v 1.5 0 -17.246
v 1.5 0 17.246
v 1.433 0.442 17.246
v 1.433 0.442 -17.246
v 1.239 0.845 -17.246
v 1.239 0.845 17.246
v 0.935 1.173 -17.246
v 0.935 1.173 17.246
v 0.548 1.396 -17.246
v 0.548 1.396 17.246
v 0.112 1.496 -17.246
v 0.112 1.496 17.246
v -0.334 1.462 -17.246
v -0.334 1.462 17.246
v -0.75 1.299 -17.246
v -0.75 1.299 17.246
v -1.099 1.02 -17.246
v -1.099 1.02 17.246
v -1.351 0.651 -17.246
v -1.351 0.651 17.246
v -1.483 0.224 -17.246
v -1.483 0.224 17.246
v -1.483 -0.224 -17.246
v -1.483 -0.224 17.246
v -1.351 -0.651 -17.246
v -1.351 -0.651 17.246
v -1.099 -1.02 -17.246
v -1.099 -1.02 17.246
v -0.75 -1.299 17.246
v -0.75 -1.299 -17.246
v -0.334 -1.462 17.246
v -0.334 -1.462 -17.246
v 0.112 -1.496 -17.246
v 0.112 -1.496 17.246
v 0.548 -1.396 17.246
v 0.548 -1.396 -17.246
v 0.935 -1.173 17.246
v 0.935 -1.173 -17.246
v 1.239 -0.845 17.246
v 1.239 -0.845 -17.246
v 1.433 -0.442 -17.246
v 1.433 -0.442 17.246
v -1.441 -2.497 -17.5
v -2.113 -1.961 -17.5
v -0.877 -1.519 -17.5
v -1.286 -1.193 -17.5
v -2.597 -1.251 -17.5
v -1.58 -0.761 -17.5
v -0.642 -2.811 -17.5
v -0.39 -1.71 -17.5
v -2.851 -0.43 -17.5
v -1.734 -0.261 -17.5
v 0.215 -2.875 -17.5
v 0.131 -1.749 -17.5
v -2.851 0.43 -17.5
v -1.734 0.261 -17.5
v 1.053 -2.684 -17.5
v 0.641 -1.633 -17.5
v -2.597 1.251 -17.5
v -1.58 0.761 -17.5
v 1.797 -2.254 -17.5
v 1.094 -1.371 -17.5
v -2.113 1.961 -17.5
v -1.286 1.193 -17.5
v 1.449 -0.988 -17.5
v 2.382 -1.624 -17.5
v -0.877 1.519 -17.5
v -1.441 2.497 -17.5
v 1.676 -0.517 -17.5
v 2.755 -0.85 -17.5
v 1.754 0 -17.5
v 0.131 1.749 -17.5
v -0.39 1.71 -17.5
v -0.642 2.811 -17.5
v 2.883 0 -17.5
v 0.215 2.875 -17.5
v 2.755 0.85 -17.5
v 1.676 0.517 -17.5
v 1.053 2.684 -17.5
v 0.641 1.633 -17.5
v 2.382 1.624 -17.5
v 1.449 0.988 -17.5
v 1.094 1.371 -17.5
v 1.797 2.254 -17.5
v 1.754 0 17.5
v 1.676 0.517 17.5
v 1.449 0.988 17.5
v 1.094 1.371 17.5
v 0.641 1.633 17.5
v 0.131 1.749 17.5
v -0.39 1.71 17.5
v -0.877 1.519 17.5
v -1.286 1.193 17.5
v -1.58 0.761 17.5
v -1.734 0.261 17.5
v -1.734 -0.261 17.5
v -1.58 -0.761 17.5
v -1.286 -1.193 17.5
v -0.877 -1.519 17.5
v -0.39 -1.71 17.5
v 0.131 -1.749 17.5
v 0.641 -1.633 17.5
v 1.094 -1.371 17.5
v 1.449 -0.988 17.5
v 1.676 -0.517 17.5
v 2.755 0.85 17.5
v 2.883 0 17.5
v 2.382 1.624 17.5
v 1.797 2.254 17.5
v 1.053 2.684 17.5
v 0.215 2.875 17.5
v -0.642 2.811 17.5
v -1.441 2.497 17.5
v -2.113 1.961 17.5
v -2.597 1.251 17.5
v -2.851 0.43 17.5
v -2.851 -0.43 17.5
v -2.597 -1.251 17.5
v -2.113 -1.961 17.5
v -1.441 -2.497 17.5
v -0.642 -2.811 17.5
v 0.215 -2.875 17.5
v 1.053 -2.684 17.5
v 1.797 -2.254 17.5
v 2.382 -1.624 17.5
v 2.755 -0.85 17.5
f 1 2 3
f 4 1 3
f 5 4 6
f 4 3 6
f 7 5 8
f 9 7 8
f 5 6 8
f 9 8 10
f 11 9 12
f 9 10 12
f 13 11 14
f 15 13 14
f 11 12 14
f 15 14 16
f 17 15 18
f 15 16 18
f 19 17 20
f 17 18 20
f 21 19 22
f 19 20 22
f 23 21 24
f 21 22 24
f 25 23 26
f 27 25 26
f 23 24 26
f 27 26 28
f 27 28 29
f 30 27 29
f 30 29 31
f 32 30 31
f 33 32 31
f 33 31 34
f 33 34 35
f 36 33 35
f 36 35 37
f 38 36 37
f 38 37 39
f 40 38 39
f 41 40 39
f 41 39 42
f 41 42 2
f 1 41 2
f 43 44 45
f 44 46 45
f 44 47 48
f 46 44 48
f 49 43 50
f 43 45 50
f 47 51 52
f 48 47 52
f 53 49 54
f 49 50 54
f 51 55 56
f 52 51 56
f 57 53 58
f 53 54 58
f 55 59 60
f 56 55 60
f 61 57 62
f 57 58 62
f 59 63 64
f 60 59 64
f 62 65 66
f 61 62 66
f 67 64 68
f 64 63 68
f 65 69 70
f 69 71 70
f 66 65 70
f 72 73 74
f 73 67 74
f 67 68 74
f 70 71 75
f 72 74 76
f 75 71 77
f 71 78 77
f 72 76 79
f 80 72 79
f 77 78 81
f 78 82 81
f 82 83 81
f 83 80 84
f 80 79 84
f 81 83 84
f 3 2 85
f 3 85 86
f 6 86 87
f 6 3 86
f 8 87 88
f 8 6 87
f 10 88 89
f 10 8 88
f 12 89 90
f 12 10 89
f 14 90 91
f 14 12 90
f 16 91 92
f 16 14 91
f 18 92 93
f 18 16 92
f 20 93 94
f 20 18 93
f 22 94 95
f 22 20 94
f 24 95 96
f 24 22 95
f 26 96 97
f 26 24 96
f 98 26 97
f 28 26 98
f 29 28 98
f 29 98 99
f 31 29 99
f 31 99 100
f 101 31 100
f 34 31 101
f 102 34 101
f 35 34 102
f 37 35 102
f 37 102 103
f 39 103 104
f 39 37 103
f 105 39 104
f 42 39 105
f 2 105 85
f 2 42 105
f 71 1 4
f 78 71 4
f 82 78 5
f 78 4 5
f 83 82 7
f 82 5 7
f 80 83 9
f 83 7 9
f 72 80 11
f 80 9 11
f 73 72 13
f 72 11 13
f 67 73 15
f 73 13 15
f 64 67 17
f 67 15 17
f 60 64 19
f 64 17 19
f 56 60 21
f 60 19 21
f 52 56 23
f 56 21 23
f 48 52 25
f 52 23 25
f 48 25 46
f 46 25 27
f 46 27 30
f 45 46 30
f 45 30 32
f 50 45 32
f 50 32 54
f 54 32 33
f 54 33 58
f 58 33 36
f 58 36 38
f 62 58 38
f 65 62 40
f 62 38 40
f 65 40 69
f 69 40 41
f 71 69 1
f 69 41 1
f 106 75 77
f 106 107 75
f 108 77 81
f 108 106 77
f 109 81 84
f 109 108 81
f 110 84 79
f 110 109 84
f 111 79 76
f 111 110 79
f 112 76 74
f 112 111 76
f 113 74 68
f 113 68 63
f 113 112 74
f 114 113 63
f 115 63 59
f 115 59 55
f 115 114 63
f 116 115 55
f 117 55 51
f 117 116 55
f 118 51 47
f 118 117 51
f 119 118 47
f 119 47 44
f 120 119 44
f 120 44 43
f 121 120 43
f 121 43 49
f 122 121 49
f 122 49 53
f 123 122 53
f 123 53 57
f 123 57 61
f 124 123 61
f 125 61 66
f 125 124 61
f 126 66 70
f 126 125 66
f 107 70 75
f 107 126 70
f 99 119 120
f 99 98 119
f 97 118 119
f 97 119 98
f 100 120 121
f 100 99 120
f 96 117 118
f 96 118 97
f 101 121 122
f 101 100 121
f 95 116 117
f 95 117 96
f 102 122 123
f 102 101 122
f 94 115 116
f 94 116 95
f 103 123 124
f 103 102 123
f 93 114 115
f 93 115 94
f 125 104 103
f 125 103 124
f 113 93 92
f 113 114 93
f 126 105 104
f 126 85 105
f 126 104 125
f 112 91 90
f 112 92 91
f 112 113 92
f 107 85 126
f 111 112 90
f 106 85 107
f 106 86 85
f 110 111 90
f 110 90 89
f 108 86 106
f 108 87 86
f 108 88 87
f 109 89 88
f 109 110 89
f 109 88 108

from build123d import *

# Parameters (mm, degrees)
F0_R     = 2.8829
F1_DEPTH = 17.5
F2_R     = 1.49987
F3_DEPTH = 35.001
F4_SIZE  = 0.254


with BuildPart() as f1:
    # F0 (on Top) → F1 (new body, symmetric)
    with BuildSketch(Plane.XY):
        Circle(F0_R)
    extrude(amount=F1_DEPTH, both=True)

    # F2 (on face) → F3 (cut, through all)
    with BuildSketch(Plane.XY.offset(17.5)):
        Circle(F2_R)
    extrude(amount=-F3_DEPTH, mode=Mode.SUBTRACT)

    # F4
    f4_edges = [f1.edges().sort_by_distance(p)[0] for p in [
        (-1.49987, 0, 17.5),
        (-1.49987, 0, -17.5),
    ]]
    chamfer(f4_edges, length=F4_SIZE)


solid = f1.part
